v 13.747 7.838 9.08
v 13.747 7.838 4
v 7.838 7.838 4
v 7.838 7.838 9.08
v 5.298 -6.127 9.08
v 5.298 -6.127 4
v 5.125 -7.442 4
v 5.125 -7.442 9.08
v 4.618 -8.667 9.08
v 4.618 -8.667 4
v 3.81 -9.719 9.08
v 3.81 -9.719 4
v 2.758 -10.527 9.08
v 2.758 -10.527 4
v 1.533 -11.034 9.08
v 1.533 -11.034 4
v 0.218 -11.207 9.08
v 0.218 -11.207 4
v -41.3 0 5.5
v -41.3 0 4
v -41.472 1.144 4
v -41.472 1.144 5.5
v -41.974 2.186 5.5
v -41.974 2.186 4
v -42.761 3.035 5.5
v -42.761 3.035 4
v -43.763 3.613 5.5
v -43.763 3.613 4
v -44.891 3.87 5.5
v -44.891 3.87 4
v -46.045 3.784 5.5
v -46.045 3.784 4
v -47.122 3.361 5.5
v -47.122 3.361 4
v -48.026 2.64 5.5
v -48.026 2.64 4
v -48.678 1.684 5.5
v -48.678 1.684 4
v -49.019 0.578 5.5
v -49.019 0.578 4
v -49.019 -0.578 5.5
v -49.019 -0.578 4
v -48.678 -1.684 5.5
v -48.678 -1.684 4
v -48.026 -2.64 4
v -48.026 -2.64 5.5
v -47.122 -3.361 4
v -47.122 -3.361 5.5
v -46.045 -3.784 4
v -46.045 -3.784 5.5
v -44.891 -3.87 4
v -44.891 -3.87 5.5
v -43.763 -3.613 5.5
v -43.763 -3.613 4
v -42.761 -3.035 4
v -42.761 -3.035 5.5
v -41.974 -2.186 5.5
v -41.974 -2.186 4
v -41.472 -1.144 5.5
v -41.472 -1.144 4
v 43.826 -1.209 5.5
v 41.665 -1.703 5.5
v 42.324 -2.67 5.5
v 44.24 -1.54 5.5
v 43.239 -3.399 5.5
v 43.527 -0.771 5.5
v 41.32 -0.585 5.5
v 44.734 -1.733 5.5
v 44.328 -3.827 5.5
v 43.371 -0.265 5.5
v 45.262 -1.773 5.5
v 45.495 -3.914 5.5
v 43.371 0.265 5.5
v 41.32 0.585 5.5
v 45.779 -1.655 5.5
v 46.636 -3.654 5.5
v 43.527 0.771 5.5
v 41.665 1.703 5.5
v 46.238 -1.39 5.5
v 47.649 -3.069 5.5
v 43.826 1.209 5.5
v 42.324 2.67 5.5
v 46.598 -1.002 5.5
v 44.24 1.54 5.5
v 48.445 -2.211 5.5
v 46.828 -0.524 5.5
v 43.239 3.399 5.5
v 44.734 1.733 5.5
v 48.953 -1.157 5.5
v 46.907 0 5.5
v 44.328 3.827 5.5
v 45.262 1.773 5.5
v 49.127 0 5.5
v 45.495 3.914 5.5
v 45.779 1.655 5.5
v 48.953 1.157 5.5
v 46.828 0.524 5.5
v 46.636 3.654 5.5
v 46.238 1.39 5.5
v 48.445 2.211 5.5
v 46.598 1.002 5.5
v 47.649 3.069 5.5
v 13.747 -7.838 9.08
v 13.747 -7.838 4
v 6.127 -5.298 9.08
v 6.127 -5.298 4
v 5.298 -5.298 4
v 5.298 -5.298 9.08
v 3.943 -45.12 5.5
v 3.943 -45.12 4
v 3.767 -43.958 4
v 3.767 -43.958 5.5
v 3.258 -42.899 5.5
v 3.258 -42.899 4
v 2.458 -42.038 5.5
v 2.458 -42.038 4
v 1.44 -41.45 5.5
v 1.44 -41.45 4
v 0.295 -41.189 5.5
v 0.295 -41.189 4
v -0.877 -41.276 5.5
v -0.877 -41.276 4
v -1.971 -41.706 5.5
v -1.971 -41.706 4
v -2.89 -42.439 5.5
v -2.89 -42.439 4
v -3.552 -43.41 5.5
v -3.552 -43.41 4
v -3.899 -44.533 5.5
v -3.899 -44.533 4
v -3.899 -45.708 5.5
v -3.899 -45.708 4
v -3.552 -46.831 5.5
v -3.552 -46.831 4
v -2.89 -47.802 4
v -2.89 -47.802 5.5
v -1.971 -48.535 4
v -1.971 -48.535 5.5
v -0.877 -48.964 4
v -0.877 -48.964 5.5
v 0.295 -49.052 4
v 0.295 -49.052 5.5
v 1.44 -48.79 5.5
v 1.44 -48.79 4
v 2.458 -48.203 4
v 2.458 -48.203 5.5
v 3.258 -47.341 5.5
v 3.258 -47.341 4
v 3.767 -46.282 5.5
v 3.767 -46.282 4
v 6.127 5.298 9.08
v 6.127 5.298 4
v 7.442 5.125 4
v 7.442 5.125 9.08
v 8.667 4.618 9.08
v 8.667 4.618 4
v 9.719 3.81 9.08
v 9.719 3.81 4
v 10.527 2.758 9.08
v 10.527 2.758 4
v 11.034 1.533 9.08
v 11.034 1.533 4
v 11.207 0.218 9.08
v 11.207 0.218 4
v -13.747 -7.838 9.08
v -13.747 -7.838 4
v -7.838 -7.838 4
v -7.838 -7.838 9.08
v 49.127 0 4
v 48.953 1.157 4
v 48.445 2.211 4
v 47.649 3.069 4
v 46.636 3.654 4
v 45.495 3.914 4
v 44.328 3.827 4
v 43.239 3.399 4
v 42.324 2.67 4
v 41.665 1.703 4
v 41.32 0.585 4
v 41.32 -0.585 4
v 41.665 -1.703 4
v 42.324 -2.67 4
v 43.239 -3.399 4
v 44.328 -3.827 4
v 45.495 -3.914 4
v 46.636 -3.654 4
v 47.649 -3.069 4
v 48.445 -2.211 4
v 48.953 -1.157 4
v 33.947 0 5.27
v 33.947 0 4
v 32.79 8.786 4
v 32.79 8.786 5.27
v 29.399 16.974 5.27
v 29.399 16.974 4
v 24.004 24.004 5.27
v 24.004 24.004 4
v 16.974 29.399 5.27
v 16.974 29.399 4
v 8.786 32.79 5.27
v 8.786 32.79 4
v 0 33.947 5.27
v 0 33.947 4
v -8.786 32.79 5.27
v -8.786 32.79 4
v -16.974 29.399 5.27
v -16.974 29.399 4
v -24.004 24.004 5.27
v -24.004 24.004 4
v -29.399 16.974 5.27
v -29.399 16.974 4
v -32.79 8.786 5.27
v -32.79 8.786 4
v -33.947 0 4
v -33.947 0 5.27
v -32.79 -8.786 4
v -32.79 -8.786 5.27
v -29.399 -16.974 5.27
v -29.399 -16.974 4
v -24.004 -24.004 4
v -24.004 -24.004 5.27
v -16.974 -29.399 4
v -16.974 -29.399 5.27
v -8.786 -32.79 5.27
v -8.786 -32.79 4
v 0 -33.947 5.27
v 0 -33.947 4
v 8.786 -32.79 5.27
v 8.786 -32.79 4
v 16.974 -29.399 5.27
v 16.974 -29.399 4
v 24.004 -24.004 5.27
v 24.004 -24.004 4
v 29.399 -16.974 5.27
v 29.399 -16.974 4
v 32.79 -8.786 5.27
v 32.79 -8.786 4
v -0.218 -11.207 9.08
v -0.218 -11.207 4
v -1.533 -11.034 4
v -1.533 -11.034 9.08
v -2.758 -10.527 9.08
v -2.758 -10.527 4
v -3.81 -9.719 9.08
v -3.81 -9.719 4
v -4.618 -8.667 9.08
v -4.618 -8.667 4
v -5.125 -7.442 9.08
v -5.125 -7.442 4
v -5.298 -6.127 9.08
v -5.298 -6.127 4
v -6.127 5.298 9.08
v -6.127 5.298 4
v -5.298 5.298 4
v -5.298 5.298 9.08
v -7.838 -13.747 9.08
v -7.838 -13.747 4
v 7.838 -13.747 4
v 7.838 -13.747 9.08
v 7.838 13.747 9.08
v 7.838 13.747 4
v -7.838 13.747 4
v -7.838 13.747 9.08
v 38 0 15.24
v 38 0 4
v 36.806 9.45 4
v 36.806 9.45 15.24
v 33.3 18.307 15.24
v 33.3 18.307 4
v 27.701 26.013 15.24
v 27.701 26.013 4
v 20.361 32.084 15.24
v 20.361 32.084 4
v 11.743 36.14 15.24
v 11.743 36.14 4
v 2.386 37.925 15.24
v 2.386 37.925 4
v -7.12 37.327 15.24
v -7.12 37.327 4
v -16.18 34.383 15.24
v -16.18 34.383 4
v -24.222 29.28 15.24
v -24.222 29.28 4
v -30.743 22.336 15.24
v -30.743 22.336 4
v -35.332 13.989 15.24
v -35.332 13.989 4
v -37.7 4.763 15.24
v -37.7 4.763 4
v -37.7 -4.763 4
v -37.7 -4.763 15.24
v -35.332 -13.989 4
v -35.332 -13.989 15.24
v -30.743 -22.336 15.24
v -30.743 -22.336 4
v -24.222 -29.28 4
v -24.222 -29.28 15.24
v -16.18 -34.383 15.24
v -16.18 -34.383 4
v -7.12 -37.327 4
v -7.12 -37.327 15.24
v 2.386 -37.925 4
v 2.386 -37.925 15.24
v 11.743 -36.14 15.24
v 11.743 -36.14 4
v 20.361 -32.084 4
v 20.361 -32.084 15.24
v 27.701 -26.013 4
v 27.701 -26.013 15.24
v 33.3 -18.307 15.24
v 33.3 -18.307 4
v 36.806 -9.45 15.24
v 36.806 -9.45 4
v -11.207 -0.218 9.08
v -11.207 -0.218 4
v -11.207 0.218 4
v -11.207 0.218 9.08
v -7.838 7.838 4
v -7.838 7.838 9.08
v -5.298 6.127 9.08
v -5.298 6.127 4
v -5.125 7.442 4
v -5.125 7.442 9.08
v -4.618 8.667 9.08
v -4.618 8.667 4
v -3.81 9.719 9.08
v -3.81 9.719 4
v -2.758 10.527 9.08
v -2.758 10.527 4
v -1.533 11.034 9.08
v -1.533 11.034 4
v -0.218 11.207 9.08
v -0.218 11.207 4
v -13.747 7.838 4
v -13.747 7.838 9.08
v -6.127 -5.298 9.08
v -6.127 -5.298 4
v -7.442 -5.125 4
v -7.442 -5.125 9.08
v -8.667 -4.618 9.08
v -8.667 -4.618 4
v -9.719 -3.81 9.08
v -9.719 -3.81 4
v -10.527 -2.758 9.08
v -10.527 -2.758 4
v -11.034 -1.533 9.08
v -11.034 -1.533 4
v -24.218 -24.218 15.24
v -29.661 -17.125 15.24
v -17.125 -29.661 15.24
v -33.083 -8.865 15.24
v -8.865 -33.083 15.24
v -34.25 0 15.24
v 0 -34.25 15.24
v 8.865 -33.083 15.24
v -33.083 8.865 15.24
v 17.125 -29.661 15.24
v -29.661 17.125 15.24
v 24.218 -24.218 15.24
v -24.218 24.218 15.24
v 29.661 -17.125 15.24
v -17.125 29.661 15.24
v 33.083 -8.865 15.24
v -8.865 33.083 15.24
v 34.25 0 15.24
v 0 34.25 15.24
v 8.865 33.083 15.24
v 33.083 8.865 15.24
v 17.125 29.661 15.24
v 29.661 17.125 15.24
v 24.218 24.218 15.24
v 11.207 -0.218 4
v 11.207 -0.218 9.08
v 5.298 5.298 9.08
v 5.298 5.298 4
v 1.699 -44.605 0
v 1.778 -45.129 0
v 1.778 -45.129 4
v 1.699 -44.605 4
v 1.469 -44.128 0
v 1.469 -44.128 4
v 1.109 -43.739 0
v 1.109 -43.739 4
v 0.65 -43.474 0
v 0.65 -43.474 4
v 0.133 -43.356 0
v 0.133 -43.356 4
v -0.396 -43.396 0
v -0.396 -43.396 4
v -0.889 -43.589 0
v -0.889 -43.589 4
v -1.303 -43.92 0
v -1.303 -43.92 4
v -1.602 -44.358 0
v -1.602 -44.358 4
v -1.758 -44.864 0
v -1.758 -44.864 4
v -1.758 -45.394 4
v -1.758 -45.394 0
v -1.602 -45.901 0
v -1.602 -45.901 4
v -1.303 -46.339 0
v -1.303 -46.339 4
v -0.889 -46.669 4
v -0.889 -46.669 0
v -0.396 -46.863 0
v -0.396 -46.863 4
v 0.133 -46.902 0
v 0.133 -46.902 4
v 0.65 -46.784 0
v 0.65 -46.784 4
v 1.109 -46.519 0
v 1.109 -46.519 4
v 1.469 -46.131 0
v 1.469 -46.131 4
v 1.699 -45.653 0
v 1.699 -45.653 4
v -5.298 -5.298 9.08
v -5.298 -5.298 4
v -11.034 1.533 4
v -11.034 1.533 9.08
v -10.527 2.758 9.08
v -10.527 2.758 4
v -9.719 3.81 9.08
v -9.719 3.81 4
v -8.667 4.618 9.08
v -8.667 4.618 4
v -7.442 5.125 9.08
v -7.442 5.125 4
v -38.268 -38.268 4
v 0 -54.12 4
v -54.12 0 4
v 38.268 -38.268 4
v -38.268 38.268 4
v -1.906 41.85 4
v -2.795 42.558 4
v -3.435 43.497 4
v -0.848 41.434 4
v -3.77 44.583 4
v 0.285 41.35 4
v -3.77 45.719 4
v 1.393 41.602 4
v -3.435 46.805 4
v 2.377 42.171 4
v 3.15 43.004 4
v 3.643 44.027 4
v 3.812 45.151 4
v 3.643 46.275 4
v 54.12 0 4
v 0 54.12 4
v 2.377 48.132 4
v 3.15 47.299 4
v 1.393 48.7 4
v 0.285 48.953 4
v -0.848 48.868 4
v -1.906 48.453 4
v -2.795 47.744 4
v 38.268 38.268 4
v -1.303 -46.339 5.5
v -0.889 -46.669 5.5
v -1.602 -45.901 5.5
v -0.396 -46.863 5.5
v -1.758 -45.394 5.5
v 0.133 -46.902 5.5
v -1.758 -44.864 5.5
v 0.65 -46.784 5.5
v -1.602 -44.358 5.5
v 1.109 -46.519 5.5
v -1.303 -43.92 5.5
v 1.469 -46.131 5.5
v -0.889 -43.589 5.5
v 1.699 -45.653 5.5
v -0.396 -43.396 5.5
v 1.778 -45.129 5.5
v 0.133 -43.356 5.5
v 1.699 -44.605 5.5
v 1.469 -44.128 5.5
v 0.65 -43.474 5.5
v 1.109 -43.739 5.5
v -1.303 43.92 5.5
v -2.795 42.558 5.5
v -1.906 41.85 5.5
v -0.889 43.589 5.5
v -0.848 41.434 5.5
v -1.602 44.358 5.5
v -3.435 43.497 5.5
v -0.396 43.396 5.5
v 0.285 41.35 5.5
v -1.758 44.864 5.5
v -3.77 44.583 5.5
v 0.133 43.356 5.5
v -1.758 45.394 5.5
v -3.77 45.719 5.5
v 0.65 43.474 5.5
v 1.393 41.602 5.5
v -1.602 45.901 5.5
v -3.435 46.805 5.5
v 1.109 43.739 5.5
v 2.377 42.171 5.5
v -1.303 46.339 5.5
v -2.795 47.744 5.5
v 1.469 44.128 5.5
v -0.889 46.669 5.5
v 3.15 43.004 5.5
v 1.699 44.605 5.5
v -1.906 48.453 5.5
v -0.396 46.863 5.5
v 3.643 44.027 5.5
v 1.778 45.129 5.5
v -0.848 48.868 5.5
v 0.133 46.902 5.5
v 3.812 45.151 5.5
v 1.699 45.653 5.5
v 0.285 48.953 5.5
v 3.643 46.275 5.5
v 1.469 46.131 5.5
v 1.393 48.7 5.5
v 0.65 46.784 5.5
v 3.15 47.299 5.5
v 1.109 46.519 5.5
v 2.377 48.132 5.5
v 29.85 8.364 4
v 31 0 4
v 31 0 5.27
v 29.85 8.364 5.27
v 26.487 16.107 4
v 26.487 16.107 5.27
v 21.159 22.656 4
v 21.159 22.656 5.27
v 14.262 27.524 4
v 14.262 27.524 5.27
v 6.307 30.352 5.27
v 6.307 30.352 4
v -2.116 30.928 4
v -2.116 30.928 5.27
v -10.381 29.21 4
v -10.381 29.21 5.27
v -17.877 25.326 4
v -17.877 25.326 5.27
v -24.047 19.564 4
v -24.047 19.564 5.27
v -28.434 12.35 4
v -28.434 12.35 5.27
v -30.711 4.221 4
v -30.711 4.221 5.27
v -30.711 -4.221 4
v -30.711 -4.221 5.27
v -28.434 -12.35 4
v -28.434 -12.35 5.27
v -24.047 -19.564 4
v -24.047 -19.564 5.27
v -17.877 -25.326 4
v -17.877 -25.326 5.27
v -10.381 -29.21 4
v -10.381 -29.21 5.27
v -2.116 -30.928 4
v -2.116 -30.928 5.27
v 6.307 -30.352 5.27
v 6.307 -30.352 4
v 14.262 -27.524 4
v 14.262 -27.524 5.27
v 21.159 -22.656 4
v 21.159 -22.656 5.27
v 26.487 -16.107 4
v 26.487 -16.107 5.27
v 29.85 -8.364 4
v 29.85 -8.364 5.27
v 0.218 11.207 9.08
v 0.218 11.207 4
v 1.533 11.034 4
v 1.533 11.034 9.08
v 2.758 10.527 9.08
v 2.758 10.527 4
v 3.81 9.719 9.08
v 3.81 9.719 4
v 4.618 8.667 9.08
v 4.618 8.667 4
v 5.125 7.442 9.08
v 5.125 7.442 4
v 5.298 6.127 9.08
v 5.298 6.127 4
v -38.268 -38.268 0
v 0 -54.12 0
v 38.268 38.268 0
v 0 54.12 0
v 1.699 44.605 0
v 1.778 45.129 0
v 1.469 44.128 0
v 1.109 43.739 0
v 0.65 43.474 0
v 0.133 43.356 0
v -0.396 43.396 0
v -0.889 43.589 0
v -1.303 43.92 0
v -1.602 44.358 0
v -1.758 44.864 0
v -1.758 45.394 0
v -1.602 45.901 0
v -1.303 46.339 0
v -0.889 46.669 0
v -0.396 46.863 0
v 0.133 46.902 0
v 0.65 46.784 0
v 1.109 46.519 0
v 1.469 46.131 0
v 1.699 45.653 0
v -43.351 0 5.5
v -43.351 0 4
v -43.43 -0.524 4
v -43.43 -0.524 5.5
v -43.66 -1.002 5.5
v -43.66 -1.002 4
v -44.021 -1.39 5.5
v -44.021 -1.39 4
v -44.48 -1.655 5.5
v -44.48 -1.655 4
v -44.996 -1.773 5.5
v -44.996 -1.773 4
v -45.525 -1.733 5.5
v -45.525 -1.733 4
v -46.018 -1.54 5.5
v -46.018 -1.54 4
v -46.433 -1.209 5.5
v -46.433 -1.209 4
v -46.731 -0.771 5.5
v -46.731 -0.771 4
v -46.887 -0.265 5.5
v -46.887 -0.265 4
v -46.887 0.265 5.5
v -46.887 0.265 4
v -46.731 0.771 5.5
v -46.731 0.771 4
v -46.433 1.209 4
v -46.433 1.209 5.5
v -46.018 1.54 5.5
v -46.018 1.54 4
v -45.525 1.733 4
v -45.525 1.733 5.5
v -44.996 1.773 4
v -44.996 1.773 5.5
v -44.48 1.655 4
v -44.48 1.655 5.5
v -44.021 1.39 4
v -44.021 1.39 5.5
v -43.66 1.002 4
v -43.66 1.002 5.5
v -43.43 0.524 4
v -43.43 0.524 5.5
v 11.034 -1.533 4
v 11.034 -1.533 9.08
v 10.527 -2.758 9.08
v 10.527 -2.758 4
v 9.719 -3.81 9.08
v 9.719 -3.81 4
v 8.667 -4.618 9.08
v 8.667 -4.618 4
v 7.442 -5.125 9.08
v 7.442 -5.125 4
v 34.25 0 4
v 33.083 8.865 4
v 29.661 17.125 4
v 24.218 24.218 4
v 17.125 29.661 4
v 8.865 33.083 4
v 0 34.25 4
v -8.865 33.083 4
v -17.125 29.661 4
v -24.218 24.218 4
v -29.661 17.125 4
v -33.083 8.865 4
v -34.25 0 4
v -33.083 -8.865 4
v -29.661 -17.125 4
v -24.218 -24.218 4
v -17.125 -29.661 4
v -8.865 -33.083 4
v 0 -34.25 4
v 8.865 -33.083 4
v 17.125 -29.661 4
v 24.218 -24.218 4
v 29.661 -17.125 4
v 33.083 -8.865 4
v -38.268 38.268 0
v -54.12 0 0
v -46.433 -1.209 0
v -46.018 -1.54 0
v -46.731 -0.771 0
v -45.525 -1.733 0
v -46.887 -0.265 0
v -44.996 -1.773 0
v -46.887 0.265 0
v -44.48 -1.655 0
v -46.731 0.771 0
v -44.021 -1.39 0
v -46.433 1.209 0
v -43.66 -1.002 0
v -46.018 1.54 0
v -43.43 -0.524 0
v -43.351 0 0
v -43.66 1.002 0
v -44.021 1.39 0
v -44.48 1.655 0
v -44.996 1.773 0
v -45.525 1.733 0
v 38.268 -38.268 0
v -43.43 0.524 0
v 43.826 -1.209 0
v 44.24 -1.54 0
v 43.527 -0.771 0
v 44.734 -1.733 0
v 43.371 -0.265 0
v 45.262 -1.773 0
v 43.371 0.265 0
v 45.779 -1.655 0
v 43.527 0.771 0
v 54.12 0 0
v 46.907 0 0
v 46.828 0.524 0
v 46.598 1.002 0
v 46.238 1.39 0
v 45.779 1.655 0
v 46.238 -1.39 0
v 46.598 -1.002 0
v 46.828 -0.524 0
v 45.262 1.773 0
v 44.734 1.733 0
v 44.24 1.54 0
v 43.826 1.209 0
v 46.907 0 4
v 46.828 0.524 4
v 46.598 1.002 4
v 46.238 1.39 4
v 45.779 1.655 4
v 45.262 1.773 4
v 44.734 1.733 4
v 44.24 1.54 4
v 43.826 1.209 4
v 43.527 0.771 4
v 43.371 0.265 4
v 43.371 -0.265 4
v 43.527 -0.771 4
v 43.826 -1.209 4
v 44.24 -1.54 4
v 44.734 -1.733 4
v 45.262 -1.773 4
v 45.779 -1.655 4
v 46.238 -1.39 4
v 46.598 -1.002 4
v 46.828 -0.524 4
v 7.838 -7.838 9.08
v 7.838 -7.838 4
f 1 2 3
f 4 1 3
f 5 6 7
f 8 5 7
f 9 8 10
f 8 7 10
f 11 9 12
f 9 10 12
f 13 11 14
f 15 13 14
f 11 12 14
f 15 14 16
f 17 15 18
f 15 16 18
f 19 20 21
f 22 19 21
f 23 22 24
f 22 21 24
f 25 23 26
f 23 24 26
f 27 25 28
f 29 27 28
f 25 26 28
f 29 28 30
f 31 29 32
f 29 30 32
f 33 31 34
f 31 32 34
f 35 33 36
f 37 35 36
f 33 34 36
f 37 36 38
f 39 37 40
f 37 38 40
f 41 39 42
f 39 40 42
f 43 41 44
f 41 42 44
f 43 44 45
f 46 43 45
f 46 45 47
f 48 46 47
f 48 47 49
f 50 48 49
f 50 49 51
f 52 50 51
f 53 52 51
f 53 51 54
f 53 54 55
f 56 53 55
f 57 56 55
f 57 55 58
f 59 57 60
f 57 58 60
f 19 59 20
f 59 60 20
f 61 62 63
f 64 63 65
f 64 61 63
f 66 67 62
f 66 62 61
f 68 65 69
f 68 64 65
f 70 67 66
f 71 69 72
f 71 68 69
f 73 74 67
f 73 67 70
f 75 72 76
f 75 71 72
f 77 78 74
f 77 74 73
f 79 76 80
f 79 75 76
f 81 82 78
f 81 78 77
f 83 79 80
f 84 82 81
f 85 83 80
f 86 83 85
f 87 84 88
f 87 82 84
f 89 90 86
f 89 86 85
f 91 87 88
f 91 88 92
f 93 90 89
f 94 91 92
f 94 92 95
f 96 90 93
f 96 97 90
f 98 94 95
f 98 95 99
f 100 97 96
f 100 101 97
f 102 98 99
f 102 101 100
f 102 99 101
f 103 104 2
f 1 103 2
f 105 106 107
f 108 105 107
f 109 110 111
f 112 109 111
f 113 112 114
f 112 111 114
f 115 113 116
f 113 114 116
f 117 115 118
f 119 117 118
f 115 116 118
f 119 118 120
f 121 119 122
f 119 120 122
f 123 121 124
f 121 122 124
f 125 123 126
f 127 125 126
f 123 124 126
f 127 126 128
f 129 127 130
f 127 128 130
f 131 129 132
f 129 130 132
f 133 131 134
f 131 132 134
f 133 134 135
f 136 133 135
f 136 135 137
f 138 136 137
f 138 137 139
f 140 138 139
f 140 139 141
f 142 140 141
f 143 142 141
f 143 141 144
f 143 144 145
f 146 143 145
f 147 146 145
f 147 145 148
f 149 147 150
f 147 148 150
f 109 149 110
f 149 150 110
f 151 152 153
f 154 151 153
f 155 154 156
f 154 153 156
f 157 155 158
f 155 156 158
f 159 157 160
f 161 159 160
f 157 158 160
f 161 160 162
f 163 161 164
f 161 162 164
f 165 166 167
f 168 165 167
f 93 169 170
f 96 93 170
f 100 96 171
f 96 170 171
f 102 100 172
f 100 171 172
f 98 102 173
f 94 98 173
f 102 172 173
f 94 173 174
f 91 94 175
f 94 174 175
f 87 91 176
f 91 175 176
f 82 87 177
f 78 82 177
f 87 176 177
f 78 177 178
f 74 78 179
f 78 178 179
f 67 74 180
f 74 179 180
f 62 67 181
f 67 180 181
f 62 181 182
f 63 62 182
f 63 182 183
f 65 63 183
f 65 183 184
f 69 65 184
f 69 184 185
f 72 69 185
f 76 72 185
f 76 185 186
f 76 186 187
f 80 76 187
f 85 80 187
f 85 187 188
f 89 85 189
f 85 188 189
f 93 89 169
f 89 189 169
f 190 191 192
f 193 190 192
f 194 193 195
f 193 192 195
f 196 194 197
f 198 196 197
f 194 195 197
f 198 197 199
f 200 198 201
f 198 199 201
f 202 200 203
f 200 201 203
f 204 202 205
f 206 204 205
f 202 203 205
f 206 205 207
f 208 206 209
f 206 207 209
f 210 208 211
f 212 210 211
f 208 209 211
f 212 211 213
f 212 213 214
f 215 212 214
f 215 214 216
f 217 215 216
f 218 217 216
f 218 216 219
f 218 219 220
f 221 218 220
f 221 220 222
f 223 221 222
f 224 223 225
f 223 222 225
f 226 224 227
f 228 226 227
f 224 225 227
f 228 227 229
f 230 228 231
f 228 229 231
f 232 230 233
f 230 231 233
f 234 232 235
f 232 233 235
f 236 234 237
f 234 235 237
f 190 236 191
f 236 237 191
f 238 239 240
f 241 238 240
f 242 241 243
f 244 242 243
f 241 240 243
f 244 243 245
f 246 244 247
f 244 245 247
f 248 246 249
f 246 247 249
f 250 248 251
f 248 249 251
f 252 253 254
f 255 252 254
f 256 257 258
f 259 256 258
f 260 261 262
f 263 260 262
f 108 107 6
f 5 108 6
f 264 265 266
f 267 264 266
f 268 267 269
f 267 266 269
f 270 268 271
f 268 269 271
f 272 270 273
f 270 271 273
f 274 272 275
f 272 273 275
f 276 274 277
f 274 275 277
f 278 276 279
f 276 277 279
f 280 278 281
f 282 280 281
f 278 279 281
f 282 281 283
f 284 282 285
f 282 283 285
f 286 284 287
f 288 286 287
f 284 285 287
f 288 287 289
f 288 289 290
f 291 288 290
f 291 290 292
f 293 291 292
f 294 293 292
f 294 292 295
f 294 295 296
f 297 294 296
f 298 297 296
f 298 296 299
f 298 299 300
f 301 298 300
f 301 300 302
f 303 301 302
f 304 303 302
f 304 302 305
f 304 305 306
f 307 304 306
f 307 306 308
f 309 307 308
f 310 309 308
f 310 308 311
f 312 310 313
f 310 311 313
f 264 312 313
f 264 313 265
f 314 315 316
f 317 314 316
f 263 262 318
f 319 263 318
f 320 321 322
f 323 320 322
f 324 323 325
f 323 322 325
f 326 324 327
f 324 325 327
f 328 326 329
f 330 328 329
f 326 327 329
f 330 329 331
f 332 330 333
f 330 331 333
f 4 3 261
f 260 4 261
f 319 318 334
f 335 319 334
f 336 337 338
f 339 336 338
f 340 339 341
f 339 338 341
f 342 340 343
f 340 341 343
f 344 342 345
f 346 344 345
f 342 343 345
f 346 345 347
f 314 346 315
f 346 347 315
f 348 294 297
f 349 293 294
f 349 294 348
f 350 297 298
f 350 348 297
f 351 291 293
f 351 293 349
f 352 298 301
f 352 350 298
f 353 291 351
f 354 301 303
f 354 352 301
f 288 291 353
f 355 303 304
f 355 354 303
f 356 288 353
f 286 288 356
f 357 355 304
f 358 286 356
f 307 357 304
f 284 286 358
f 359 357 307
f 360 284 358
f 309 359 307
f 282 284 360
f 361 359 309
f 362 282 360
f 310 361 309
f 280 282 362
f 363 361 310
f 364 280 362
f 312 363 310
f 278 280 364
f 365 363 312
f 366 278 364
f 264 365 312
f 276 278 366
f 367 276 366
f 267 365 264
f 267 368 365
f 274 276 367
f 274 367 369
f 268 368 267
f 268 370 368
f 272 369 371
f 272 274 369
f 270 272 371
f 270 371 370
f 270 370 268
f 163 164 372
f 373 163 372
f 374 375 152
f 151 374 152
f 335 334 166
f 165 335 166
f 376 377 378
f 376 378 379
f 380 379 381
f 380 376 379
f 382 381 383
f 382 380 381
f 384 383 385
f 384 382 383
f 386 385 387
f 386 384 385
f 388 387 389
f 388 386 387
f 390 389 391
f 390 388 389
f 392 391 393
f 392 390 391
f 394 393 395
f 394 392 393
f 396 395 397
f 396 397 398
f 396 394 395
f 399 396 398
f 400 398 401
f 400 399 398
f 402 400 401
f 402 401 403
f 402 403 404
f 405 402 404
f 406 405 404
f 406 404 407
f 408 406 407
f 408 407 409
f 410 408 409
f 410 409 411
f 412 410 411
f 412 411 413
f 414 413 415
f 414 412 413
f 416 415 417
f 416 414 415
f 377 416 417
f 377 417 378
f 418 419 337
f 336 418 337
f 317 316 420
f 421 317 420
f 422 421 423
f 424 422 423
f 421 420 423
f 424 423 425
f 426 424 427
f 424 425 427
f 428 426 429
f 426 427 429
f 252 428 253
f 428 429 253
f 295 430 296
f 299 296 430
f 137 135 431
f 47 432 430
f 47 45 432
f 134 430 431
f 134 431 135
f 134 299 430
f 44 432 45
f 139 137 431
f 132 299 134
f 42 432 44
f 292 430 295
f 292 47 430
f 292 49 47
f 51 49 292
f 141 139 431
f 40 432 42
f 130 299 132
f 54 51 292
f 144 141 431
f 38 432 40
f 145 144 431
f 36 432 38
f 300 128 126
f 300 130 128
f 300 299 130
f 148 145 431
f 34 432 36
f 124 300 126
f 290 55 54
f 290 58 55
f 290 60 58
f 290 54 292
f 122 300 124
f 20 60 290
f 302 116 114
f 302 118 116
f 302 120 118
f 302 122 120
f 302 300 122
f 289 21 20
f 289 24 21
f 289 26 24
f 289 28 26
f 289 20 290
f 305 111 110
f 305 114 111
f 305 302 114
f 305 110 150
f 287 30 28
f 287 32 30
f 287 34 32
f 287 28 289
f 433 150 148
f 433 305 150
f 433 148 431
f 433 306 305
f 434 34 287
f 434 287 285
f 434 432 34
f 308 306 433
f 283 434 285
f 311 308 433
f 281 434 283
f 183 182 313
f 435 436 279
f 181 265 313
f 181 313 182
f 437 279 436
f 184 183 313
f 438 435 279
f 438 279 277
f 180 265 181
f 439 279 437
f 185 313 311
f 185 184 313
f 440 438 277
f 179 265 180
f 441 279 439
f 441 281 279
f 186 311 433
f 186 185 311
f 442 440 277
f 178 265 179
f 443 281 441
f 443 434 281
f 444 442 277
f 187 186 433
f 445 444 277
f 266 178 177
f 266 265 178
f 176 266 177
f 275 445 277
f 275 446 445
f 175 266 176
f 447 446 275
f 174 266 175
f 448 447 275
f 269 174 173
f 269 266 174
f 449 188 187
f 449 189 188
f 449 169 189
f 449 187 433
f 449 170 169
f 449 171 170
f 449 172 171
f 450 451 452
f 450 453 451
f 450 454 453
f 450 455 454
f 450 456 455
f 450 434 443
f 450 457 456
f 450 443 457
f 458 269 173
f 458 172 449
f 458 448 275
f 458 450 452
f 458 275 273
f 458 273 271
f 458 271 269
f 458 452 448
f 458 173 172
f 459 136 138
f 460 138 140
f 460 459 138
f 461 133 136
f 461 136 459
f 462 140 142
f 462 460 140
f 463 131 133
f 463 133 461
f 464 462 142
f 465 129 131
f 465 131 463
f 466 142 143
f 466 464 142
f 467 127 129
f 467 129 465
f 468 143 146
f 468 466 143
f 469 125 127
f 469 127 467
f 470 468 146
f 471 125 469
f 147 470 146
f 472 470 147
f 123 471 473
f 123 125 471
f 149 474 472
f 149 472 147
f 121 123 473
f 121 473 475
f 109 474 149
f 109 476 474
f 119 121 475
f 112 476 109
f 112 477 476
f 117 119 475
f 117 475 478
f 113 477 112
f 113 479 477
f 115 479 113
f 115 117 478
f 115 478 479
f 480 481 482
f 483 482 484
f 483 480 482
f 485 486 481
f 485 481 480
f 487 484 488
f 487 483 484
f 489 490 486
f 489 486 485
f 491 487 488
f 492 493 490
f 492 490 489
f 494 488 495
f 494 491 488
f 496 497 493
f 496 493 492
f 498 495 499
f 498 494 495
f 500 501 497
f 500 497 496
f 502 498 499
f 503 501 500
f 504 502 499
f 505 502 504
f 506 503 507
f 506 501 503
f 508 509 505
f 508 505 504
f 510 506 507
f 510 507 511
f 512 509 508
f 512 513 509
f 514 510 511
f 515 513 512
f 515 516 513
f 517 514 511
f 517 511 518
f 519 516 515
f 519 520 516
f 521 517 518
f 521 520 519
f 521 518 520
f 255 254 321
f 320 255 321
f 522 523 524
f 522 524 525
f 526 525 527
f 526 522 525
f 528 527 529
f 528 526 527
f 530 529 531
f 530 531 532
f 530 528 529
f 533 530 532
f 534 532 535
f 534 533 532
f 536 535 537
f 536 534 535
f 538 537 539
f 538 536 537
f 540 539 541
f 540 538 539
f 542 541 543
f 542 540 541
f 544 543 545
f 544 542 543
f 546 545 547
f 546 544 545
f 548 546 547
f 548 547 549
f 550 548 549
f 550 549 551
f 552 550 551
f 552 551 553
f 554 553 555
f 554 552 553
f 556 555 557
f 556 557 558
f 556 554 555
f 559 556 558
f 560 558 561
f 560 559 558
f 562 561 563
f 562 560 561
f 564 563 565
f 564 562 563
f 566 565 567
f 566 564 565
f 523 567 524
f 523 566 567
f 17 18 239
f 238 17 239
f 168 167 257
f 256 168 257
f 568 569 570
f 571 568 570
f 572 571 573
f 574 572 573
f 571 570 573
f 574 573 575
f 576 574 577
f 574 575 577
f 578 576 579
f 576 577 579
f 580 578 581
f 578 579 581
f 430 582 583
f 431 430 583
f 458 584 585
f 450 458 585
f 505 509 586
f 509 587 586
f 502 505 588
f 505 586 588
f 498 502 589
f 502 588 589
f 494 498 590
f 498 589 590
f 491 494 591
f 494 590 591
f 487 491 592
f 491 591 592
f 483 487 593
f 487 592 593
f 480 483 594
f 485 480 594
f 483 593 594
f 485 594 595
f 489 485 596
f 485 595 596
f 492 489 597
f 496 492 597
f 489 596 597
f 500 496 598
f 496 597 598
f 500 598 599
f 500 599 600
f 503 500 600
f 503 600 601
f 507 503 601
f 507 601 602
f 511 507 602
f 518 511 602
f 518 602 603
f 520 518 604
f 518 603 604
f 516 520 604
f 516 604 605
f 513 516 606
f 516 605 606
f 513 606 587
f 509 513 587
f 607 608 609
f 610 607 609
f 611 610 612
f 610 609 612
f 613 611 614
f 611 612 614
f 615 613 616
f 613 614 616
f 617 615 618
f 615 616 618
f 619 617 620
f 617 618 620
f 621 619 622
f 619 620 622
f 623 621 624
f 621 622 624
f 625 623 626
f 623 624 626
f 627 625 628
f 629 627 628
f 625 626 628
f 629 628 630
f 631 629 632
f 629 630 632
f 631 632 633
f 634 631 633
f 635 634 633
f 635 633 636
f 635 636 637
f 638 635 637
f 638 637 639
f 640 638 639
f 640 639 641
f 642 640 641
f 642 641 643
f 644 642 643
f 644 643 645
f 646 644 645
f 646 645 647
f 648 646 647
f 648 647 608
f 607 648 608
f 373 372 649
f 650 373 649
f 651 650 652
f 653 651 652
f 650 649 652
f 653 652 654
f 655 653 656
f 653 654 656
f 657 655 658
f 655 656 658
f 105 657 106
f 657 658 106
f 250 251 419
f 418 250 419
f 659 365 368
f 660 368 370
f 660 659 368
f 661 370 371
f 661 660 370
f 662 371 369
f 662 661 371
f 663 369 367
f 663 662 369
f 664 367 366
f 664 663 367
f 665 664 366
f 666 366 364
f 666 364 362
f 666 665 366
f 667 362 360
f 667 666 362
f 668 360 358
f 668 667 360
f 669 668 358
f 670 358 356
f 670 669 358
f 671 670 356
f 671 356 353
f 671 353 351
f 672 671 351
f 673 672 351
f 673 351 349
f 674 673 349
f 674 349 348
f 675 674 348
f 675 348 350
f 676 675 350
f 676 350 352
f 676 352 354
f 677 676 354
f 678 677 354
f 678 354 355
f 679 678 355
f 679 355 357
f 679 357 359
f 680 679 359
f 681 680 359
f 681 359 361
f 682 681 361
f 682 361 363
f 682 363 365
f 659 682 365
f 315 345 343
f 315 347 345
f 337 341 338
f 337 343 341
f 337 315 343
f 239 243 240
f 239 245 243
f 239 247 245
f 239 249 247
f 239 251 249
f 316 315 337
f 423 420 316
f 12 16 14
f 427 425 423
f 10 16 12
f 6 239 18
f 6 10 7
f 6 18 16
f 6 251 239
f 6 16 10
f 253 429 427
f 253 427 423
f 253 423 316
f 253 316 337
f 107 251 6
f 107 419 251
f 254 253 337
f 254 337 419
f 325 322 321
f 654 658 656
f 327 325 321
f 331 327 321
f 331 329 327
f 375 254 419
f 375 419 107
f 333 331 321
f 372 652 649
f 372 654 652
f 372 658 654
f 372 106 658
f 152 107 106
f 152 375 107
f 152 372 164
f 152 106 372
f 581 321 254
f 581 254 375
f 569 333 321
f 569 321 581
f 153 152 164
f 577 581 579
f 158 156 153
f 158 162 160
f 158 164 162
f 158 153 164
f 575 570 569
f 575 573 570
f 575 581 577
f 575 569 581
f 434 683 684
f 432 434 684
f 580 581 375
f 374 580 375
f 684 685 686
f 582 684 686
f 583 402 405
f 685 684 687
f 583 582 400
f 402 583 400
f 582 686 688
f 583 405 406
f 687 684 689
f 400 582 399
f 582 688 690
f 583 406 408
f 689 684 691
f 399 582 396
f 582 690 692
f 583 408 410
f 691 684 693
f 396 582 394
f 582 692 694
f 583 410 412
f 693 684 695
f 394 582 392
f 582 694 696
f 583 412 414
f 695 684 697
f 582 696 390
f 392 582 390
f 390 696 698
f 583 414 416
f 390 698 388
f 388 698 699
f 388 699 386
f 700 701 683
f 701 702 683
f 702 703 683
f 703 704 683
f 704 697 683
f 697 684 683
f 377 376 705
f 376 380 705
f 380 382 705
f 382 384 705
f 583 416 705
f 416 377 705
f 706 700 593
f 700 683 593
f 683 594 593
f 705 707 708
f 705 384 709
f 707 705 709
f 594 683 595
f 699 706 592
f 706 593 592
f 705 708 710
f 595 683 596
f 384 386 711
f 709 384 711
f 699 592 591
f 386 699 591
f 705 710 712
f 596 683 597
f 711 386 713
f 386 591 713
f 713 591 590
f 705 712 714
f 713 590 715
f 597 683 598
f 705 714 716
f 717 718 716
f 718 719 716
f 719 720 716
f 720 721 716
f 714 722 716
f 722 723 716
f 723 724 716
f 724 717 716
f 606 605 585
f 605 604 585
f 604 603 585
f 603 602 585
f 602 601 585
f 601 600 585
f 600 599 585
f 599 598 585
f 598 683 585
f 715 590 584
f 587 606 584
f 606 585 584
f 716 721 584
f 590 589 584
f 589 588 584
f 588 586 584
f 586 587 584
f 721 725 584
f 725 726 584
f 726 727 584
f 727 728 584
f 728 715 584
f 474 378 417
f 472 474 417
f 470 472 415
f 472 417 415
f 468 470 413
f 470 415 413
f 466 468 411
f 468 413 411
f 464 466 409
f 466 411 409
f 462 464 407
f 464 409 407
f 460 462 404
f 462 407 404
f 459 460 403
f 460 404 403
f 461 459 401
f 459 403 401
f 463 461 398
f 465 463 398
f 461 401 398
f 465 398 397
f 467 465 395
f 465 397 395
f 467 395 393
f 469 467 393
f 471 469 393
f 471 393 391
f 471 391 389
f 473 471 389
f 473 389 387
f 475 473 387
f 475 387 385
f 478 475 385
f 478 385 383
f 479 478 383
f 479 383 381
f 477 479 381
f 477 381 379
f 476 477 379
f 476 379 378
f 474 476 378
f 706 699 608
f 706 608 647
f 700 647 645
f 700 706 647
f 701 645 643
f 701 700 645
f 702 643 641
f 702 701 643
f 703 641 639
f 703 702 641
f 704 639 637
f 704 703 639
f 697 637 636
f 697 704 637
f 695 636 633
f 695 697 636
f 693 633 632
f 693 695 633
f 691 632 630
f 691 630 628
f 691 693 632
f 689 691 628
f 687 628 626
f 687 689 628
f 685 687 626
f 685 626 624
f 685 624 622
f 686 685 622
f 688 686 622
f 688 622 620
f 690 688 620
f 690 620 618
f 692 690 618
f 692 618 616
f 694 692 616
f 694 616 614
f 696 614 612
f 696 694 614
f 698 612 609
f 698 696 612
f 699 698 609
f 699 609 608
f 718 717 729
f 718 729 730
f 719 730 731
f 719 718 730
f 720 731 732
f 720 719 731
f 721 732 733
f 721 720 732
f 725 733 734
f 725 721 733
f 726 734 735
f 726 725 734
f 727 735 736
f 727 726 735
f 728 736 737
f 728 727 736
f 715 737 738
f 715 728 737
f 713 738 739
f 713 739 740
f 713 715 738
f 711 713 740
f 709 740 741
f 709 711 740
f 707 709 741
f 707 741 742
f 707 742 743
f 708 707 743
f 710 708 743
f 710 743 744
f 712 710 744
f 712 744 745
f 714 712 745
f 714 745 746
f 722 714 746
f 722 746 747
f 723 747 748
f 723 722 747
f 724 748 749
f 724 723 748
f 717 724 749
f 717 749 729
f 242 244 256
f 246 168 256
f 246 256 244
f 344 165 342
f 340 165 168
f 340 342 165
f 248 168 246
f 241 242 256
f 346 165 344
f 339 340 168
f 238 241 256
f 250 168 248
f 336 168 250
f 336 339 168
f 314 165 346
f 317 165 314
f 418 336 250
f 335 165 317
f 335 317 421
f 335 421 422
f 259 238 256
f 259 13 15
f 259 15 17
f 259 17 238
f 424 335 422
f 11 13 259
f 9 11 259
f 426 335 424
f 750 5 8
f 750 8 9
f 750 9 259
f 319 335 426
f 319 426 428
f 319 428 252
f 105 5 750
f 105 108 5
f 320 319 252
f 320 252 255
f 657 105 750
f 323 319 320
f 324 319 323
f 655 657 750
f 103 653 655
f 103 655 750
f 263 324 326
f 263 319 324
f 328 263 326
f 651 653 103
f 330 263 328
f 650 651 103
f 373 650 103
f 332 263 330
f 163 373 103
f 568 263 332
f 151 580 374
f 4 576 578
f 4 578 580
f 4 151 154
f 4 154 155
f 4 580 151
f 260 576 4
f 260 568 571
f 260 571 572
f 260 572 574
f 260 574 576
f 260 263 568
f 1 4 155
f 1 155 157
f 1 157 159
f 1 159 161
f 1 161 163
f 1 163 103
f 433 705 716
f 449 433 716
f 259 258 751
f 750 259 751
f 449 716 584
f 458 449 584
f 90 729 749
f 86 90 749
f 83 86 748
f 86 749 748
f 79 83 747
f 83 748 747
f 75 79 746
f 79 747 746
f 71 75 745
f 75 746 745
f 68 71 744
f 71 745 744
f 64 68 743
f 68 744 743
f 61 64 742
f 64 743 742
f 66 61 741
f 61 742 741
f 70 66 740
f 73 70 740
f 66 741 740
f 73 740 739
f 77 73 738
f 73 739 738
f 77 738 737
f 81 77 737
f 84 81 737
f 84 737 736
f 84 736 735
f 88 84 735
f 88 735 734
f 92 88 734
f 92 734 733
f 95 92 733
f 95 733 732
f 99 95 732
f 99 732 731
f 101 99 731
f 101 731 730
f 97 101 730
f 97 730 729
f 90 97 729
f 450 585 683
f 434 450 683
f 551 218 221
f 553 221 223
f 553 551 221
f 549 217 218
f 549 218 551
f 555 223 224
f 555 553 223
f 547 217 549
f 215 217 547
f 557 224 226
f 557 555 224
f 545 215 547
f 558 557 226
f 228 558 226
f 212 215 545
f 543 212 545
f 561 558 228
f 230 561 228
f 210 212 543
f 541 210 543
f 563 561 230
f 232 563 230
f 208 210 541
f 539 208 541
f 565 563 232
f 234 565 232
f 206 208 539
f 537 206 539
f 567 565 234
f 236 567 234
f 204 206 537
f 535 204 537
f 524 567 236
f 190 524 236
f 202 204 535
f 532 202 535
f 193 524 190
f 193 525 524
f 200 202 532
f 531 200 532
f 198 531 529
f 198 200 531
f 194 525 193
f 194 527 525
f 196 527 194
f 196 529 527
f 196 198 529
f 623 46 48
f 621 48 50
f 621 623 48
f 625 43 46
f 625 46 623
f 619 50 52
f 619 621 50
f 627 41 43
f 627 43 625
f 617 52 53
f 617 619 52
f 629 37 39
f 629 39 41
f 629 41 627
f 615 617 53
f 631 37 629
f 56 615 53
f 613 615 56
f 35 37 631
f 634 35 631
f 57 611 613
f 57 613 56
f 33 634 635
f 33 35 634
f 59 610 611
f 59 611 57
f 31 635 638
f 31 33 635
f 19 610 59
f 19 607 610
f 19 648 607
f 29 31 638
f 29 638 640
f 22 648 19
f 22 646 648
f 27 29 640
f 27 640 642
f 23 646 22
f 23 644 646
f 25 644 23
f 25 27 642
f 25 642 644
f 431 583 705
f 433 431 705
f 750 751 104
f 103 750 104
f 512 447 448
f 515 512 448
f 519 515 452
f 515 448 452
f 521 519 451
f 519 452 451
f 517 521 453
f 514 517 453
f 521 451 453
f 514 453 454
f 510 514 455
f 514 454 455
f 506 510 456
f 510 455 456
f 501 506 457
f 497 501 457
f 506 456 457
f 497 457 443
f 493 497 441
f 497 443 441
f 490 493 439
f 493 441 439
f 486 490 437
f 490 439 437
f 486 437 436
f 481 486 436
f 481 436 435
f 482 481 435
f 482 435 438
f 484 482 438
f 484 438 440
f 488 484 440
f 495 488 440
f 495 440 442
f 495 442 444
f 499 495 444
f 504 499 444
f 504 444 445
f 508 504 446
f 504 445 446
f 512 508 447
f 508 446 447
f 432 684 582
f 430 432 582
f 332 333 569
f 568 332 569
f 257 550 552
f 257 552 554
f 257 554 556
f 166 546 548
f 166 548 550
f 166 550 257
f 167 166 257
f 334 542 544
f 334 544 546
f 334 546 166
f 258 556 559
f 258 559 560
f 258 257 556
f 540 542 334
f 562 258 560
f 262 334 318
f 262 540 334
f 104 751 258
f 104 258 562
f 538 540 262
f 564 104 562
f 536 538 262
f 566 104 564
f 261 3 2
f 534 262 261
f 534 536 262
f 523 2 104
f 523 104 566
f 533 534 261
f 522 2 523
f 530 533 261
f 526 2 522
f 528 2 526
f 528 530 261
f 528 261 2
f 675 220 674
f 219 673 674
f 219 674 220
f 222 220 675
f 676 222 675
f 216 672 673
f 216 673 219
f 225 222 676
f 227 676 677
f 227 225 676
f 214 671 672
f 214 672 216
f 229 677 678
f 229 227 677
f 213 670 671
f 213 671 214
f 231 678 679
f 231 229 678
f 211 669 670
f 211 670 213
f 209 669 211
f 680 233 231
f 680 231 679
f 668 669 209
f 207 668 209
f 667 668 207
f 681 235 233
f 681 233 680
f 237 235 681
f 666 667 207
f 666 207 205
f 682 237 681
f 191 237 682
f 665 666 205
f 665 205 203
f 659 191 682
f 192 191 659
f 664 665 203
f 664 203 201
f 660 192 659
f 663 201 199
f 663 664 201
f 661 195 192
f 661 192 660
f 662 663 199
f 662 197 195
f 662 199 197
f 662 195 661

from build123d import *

# Parameters (mm, degrees)
F0_R      = 1.778
F1_DEPTH  = 4
F2_R      = 38
F2_R_2    = 34.25
F3_DEPTH  = 15.24
F4_R      = 33.9471
F4_R_2    = 31
F5_DEPTH  = 1.27
F7_DEPTH  = 5.08
F8_R      = 3.81221
F8_R_2    = 3.881316
F8_R_3    = 3.942619
F8_R_4    = 3.925346
F9_DEPTH  = 1.5
F10_R     = 1.778
F11_DEPTH = 25.4


with BuildPart() as f1:
    # F0 (on Top) → F1 (new body)
    with BuildSketch(Plane.XY):
        Polygon((38.268343, -38.268343), (54.11961, 0), (38.268343, 38.268343), (0, 54.11961), (-38.268343, 38.268343), (-54.11961, 0), (-38.268343, -38.268343), (0, -54.11961), align=None)
        with Locations((0, -45.129232)):
            Circle(F0_R, mode=Mode.SUBTRACT)
        with Locations((-45.129232, 0)):
            Circle(F0_R, mode=Mode.SUBTRACT)
        with Locations((45.129232, 0)):
            Circle(F0_R, mode=Mode.SUBTRACT)
        with Locations((0, 45.129232)):
            Circle(F0_R, mode=Mode.SUBTRACT)
    extrude(amount=F1_DEPTH)

    # F2 (on Top) → F3 (join)
    with BuildSketch(Plane.XY):
        Circle(F2_R)
        Circle(F2_R_2, mode=Mode.SUBTRACT)
    extrude(amount=F3_DEPTH)

    # F4 (on face) → F5 (join)
    with BuildSketch(Plane.XY.offset(4)):
        Circle(F4_R)
        Circle(F4_R_2, mode=Mode.SUBTRACT)
    extrude(amount=F5_DEPTH)

    # F6 (on face) → F7 (join)
    with BuildSketch(Plane.XY.offset(4)):
        Polygon((7.838351, 13.74736), (-7.838351, 13.74736), (-7.838351, 11.297162), (-7.838351, 7.838351), (-11.297162, 7.838351), (-13.74736, 7.838351), (-13.74736, -7.838351), (-11.117557, -7.838351), (-7.838351, -7.838351), (-7.838351, -11.117557), (-7.838351, -13.74736), (7.838351, -13.74736), (7.838351, -11.297162), (7.838351, -7.838351), (11.297162, -7.838351), (13.74736, -7.838351), (13.74736, 7.838351), (11.117557, 7.838351), (7.838351, 7.838351), (7.838351, 11.117557), align=None)
        with BuildLine():
            ThreePointArc((-5.298351, 6.12736), (-3.810454, 9.719462), (-0.218351, 11.20736))
            Line((-0.218351, 11.20736), (0.218351, 11.20736))
            ThreePointArc((0.218351, 11.20736), (3.810454, 9.719462), (5.298351, 6.12736))
            Line((5.298351, 6.12736), (5.298351, 5.298351))
            Line((5.298351, 5.298351), (6.12736, 5.298351))
            ThreePointArc((6.12736, 5.298351), (9.719462, 3.810454), (11.20736, 0.218351))
            Line((11.20736, 0.218351), (11.20736, -0.218351))
            ThreePointArc((11.20736, -0.218351), (9.719462, -3.810454), (6.12736, -5.298351))
            Line((6.12736, -5.298351), (5.298351, -5.298351))
            Line((5.298351, -5.298351), (5.298351, -6.12736))
            ThreePointArc((5.298351, -6.12736), (3.810454, -9.719462), (0.218351, -11.20736))
            Line((0.218351, -11.20736), (-0.218351, -11.20736))
            ThreePointArc((-0.218351, -11.20736), (-3.810454, -9.719462), (-5.298351, -6.12736))
            Line((-5.298351, -6.12736), (-5.298351, -5.298351))
            Line((-5.298351, -5.298351), (-6.12736, -5.298351))
            ThreePointArc((-6.12736, -5.298351), (-9.719462, -3.810454), (-11.20736, -0.218351))
            Line((-11.20736, -0.218351), (-11.20736, 0.218351))
            ThreePointArc((-11.20736, 0.218351), (-9.719462, 3.810454), (-6.12736, 5.298351))
            Line((-6.12736, 5.298351), (-5.298351, 5.298351))
            Line((-5.298351, 5.298351), (-5.298351, 6.12736))
        make_face(mode=Mode.SUBTRACT)
    extrude(amount=F7_DEPTH)

    # F8 (on face) → F9 (join)
    with BuildSketch(Plane.XY.offset(4)):
        with Locations((0, 45.151103)):
            Circle(F8_R)
        with Locations((-45.181099, 0)):
            Circle(F8_R_2)
        with Locations((0, -45.120213)):
            Circle(F8_R_3)
        with Locations((45.201581, 0)):
            Circle(F8_R_4)
    extrude(amount=F9_DEPTH)

    # F10 (on face) → F11 (cut)
    with BuildSketch(Plane(origin=(0, 0, 0), x_dir=(1, 0, 0), z_dir=(0, 0, -1))):
        with Locations((45.129232, 0)):
            Circle(F10_R)
        with Locations((0, -45.129232)):
            Circle(F10_R)
        with Locations((-45.129232, 0)):
            Circle(F10_R)
        with Locations((0, 45.129232)):
            Circle(F10_R)
    extrude(amount=-F11_DEPTH, mode=Mode.SUBTRACT)


solid = f1.part
